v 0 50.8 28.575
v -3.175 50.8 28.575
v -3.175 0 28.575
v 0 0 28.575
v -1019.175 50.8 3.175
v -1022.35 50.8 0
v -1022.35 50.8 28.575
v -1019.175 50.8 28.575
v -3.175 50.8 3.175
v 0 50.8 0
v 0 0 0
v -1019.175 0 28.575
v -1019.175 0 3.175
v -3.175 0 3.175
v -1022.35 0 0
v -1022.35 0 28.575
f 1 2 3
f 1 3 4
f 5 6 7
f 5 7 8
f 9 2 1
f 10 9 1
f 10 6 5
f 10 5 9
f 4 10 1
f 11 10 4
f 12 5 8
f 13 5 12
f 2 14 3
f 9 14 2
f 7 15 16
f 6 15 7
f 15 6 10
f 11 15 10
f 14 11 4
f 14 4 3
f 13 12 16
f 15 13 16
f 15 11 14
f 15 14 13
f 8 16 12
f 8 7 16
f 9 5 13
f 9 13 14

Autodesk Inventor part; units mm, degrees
ref_plane "YZ Plane" through (0, 0, 0) normal (1, 0, 0) x (0, 1, 0)
ref_plane "XZ Plane" through (0, 0, 0) normal (0, 1, 0) x (-1, 0, 0)
ref_plane "XY Plane" through (0, 0, 0) normal (0, 0, 1) x (1, 0, 0)
sketch "Sketch2" plane through (0, 0, 0) normal (0, 0, 1) x (1, 0, 0)
  line L0 (0, 0) -> (-1022.35, 0)
  line L1 (-1022.35, 0) -> (-1022.35, 50.8)
  line L2 (-1022.35, 50.8) -> (0, 50.8)
  line L3 (0, 50.8) -> (0, 0)
  dimension "d0" = 50.8
  dimension "d1" = 1022.35
extrude "Extrusion1" add sketch "Sketch2" along normal blind 3.175
sketch "Sketch3" plane through (0, 0, 3.175) normal (0, 0, 1) x (1, 0, 0)
  line L0 (0, 50.8) -> (-1022.35, 50.8) projected
  line L1 (0, 0) -> (-3.175, 0)
  line L2 (-3.175, 0) -> (-3.175, 50.8)
  line L3 (-3.175, 50.8) -> (0, 50.8)
  line L4 (0, 50.8) -> (0, 0)
  line L5 (-1022.35, 50.8) -> (-1019.175, 50.8)
  line L6 (-1019.175, 50.8) -> (-1019.175, 0)
  line L7 (-1019.175, 0) -> (-1022.35, 0)
  line L8 (-1022.35, 0) -> (-1022.35, 50.8)
  dimension "d4" = 3.175
  dimension "d5" = 3.175
extrude "Extrusion2" add sketch "Sketch3" along normal blind 25.4
sketch "Sketch4" plane through (0, 0, 3.175) normal (0, 0, 1) x (1, 0, 0)
  line L0 (-1019.175, 0) -> (-1019.175, 50.8)
  line L1 (-1019.175, 50.8) -> (-1019.175, 0) projected
  line L2 (-3.175, 0) -> (-3.175, 50.8)
  circle A0 centre (-892.175, 25.4) radius 6.2992
  circle A1 centre (-130.175, 25.4) radius 6.2992
  line L3 (-1019.175, 0) -> (-3.175, 0)
  line L4 (-1019.175, 0) -> (-3.175, 0) projected
  point P0 (0, 0)
  dimension "d8" = 12.5984
  dimension "d9" = 12.5984
  dimension "d10" = 25.4
  dimension "d11" = 127
  dimension "d12" = 127
  dimension "d13" = 25.4
properties part number "Bumpers"
